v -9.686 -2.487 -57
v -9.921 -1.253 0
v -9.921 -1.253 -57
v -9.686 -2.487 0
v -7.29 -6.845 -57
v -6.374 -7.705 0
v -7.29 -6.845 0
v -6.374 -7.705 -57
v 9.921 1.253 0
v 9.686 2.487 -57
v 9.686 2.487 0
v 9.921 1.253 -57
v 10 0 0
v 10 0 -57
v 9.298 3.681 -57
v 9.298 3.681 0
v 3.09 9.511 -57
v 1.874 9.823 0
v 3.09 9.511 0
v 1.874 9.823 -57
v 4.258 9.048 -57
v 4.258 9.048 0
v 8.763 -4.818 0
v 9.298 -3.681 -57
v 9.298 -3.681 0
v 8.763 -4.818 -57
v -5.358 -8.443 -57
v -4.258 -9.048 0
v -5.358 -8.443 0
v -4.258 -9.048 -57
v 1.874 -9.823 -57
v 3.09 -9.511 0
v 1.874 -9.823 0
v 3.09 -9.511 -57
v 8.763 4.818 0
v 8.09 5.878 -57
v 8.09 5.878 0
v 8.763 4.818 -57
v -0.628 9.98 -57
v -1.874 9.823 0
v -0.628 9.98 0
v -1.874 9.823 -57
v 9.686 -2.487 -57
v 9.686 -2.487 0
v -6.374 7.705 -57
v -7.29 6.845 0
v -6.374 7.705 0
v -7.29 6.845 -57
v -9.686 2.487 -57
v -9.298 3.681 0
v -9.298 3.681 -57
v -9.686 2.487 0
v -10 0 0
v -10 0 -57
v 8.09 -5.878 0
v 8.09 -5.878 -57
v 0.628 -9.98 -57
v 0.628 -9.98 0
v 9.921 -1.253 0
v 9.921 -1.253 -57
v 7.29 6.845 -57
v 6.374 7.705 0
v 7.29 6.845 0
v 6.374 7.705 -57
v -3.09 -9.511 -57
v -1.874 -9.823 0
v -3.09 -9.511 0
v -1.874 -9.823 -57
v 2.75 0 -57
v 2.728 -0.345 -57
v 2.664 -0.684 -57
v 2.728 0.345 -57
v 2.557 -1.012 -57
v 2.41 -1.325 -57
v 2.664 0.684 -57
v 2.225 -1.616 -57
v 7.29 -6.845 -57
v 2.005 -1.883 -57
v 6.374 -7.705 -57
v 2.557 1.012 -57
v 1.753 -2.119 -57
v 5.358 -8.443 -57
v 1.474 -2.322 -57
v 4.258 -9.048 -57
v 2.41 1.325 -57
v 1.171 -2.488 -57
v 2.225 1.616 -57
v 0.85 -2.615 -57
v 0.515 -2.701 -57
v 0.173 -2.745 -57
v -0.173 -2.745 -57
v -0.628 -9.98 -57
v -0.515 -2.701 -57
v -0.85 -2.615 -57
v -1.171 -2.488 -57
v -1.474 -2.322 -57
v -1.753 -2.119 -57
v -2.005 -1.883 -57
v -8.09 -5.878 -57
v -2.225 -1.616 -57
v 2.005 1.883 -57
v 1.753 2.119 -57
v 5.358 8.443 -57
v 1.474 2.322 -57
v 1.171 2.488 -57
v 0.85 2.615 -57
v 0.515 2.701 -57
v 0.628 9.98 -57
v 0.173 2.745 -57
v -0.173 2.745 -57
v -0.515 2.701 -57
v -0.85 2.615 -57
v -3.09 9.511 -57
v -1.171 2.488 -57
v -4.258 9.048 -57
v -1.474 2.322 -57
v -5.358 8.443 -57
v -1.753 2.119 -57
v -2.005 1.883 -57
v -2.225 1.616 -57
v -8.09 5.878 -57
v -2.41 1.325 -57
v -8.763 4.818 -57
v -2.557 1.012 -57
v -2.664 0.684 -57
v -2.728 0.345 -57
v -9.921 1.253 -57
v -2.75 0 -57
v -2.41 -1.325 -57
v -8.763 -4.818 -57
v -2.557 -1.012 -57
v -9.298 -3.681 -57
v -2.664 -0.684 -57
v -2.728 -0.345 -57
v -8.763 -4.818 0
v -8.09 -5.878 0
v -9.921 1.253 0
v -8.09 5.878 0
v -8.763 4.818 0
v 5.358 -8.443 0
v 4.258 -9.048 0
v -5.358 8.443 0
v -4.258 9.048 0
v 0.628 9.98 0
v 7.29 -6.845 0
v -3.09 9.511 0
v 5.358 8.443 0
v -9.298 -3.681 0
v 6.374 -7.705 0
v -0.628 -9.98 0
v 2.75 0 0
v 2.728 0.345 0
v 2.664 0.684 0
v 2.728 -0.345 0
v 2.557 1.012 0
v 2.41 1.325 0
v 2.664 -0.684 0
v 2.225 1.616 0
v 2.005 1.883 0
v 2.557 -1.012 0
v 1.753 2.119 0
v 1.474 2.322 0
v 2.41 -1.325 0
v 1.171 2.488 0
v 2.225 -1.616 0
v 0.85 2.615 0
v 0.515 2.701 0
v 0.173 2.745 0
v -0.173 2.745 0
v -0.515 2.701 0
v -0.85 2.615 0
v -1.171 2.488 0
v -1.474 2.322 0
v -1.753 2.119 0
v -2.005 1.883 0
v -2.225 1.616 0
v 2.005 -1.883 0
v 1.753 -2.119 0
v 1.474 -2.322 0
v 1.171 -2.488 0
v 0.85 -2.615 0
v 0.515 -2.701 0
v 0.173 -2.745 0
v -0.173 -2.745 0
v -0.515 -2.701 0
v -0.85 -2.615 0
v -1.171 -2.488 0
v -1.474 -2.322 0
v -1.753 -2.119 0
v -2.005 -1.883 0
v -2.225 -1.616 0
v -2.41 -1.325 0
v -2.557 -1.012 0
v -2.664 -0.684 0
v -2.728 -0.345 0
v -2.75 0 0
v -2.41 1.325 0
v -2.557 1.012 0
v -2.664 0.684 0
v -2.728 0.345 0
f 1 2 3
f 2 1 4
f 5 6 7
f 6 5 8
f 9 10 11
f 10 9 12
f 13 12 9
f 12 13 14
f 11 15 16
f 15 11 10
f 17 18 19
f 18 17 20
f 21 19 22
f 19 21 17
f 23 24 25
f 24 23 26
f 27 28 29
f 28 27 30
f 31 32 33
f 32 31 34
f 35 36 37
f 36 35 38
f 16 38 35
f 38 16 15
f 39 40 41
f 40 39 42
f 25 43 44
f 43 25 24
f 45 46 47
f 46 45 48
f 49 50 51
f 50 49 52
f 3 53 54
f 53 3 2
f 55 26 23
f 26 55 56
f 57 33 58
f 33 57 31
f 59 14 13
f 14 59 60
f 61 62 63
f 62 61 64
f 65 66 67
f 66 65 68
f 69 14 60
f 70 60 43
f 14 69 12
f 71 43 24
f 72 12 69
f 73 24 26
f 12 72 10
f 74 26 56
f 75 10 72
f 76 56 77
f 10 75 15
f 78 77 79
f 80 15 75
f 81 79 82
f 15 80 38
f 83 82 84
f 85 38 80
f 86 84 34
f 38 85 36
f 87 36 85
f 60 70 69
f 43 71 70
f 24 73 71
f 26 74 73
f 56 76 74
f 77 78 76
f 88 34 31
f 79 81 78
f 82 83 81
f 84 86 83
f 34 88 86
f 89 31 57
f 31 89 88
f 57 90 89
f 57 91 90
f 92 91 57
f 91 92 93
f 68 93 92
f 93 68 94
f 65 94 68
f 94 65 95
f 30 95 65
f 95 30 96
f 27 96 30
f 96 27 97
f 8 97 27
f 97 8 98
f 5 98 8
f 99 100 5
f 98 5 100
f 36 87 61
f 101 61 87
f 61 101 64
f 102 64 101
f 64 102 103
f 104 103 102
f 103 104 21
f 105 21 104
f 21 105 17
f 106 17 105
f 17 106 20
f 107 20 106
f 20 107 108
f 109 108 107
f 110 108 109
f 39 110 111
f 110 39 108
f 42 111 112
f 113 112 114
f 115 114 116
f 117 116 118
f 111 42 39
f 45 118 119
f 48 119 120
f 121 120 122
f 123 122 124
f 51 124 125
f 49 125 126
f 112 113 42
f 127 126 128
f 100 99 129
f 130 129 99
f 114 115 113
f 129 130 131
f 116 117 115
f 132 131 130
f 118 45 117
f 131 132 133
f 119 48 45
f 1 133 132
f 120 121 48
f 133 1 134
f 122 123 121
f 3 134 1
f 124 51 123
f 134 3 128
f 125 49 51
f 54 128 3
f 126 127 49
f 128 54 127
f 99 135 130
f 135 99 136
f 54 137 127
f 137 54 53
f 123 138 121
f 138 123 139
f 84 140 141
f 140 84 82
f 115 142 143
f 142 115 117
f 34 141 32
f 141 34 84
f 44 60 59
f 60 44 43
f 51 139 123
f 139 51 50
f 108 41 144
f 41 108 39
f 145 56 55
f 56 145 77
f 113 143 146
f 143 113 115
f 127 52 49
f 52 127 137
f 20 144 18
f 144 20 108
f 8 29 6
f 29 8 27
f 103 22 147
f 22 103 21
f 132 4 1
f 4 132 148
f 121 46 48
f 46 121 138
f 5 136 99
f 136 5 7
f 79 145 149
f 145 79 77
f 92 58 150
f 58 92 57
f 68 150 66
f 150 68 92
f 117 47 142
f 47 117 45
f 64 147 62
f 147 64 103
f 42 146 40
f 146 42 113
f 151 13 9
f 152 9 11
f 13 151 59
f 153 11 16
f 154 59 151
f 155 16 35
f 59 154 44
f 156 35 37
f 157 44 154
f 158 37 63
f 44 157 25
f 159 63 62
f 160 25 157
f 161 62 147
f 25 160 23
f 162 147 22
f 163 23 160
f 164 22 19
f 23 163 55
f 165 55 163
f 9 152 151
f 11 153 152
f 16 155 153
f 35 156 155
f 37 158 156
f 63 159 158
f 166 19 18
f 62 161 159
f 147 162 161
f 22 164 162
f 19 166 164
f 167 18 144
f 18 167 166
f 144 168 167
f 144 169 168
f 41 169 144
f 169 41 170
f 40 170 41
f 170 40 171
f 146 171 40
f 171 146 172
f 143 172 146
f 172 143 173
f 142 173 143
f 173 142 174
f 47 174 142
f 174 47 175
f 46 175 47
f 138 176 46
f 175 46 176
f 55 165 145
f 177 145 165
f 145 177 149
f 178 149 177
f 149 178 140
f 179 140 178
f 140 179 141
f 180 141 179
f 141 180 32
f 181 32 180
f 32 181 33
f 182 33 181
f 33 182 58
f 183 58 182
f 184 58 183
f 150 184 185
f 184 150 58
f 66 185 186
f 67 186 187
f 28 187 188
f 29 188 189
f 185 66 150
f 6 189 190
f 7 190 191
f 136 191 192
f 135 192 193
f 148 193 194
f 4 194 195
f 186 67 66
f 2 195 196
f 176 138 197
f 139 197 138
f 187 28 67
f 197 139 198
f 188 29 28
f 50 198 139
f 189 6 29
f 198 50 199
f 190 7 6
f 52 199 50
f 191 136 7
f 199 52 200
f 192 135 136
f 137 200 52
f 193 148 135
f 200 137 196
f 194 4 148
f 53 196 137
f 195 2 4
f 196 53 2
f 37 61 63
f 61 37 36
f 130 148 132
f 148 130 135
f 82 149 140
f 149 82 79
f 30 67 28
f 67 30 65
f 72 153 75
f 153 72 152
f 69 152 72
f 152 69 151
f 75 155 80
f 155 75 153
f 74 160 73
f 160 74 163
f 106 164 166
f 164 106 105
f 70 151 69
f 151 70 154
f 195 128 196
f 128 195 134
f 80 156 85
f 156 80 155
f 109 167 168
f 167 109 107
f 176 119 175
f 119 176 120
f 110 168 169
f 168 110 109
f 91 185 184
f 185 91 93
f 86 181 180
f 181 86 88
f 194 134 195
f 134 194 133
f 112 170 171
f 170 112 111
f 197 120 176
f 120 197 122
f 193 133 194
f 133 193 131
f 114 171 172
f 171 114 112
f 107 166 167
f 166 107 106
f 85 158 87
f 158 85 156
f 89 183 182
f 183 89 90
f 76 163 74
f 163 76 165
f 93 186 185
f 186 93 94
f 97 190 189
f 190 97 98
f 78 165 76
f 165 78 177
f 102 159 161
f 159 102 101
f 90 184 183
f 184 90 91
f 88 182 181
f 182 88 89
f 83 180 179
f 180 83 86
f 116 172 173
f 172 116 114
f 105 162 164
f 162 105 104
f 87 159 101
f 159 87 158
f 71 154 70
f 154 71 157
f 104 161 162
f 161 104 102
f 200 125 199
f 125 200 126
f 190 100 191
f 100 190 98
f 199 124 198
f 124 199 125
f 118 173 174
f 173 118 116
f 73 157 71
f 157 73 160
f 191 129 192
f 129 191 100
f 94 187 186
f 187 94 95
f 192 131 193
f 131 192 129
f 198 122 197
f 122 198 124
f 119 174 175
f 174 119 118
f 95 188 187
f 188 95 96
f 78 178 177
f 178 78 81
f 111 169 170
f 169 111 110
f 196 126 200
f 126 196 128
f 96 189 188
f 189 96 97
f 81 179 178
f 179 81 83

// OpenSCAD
$fn = 50;


difference() {
	union() {
		translate(v = [0, 0, -57.0000000000]) {
			cylinder(h = 57, r = 10.0000000000);
		}
		cylinder(h = 0, r = 20.0000000000);
	}
	union() {
		#translate(v = [0, 0, -57]) {
			cylinder(h = 57, r = 2.7500000000);
		}
	}
}
